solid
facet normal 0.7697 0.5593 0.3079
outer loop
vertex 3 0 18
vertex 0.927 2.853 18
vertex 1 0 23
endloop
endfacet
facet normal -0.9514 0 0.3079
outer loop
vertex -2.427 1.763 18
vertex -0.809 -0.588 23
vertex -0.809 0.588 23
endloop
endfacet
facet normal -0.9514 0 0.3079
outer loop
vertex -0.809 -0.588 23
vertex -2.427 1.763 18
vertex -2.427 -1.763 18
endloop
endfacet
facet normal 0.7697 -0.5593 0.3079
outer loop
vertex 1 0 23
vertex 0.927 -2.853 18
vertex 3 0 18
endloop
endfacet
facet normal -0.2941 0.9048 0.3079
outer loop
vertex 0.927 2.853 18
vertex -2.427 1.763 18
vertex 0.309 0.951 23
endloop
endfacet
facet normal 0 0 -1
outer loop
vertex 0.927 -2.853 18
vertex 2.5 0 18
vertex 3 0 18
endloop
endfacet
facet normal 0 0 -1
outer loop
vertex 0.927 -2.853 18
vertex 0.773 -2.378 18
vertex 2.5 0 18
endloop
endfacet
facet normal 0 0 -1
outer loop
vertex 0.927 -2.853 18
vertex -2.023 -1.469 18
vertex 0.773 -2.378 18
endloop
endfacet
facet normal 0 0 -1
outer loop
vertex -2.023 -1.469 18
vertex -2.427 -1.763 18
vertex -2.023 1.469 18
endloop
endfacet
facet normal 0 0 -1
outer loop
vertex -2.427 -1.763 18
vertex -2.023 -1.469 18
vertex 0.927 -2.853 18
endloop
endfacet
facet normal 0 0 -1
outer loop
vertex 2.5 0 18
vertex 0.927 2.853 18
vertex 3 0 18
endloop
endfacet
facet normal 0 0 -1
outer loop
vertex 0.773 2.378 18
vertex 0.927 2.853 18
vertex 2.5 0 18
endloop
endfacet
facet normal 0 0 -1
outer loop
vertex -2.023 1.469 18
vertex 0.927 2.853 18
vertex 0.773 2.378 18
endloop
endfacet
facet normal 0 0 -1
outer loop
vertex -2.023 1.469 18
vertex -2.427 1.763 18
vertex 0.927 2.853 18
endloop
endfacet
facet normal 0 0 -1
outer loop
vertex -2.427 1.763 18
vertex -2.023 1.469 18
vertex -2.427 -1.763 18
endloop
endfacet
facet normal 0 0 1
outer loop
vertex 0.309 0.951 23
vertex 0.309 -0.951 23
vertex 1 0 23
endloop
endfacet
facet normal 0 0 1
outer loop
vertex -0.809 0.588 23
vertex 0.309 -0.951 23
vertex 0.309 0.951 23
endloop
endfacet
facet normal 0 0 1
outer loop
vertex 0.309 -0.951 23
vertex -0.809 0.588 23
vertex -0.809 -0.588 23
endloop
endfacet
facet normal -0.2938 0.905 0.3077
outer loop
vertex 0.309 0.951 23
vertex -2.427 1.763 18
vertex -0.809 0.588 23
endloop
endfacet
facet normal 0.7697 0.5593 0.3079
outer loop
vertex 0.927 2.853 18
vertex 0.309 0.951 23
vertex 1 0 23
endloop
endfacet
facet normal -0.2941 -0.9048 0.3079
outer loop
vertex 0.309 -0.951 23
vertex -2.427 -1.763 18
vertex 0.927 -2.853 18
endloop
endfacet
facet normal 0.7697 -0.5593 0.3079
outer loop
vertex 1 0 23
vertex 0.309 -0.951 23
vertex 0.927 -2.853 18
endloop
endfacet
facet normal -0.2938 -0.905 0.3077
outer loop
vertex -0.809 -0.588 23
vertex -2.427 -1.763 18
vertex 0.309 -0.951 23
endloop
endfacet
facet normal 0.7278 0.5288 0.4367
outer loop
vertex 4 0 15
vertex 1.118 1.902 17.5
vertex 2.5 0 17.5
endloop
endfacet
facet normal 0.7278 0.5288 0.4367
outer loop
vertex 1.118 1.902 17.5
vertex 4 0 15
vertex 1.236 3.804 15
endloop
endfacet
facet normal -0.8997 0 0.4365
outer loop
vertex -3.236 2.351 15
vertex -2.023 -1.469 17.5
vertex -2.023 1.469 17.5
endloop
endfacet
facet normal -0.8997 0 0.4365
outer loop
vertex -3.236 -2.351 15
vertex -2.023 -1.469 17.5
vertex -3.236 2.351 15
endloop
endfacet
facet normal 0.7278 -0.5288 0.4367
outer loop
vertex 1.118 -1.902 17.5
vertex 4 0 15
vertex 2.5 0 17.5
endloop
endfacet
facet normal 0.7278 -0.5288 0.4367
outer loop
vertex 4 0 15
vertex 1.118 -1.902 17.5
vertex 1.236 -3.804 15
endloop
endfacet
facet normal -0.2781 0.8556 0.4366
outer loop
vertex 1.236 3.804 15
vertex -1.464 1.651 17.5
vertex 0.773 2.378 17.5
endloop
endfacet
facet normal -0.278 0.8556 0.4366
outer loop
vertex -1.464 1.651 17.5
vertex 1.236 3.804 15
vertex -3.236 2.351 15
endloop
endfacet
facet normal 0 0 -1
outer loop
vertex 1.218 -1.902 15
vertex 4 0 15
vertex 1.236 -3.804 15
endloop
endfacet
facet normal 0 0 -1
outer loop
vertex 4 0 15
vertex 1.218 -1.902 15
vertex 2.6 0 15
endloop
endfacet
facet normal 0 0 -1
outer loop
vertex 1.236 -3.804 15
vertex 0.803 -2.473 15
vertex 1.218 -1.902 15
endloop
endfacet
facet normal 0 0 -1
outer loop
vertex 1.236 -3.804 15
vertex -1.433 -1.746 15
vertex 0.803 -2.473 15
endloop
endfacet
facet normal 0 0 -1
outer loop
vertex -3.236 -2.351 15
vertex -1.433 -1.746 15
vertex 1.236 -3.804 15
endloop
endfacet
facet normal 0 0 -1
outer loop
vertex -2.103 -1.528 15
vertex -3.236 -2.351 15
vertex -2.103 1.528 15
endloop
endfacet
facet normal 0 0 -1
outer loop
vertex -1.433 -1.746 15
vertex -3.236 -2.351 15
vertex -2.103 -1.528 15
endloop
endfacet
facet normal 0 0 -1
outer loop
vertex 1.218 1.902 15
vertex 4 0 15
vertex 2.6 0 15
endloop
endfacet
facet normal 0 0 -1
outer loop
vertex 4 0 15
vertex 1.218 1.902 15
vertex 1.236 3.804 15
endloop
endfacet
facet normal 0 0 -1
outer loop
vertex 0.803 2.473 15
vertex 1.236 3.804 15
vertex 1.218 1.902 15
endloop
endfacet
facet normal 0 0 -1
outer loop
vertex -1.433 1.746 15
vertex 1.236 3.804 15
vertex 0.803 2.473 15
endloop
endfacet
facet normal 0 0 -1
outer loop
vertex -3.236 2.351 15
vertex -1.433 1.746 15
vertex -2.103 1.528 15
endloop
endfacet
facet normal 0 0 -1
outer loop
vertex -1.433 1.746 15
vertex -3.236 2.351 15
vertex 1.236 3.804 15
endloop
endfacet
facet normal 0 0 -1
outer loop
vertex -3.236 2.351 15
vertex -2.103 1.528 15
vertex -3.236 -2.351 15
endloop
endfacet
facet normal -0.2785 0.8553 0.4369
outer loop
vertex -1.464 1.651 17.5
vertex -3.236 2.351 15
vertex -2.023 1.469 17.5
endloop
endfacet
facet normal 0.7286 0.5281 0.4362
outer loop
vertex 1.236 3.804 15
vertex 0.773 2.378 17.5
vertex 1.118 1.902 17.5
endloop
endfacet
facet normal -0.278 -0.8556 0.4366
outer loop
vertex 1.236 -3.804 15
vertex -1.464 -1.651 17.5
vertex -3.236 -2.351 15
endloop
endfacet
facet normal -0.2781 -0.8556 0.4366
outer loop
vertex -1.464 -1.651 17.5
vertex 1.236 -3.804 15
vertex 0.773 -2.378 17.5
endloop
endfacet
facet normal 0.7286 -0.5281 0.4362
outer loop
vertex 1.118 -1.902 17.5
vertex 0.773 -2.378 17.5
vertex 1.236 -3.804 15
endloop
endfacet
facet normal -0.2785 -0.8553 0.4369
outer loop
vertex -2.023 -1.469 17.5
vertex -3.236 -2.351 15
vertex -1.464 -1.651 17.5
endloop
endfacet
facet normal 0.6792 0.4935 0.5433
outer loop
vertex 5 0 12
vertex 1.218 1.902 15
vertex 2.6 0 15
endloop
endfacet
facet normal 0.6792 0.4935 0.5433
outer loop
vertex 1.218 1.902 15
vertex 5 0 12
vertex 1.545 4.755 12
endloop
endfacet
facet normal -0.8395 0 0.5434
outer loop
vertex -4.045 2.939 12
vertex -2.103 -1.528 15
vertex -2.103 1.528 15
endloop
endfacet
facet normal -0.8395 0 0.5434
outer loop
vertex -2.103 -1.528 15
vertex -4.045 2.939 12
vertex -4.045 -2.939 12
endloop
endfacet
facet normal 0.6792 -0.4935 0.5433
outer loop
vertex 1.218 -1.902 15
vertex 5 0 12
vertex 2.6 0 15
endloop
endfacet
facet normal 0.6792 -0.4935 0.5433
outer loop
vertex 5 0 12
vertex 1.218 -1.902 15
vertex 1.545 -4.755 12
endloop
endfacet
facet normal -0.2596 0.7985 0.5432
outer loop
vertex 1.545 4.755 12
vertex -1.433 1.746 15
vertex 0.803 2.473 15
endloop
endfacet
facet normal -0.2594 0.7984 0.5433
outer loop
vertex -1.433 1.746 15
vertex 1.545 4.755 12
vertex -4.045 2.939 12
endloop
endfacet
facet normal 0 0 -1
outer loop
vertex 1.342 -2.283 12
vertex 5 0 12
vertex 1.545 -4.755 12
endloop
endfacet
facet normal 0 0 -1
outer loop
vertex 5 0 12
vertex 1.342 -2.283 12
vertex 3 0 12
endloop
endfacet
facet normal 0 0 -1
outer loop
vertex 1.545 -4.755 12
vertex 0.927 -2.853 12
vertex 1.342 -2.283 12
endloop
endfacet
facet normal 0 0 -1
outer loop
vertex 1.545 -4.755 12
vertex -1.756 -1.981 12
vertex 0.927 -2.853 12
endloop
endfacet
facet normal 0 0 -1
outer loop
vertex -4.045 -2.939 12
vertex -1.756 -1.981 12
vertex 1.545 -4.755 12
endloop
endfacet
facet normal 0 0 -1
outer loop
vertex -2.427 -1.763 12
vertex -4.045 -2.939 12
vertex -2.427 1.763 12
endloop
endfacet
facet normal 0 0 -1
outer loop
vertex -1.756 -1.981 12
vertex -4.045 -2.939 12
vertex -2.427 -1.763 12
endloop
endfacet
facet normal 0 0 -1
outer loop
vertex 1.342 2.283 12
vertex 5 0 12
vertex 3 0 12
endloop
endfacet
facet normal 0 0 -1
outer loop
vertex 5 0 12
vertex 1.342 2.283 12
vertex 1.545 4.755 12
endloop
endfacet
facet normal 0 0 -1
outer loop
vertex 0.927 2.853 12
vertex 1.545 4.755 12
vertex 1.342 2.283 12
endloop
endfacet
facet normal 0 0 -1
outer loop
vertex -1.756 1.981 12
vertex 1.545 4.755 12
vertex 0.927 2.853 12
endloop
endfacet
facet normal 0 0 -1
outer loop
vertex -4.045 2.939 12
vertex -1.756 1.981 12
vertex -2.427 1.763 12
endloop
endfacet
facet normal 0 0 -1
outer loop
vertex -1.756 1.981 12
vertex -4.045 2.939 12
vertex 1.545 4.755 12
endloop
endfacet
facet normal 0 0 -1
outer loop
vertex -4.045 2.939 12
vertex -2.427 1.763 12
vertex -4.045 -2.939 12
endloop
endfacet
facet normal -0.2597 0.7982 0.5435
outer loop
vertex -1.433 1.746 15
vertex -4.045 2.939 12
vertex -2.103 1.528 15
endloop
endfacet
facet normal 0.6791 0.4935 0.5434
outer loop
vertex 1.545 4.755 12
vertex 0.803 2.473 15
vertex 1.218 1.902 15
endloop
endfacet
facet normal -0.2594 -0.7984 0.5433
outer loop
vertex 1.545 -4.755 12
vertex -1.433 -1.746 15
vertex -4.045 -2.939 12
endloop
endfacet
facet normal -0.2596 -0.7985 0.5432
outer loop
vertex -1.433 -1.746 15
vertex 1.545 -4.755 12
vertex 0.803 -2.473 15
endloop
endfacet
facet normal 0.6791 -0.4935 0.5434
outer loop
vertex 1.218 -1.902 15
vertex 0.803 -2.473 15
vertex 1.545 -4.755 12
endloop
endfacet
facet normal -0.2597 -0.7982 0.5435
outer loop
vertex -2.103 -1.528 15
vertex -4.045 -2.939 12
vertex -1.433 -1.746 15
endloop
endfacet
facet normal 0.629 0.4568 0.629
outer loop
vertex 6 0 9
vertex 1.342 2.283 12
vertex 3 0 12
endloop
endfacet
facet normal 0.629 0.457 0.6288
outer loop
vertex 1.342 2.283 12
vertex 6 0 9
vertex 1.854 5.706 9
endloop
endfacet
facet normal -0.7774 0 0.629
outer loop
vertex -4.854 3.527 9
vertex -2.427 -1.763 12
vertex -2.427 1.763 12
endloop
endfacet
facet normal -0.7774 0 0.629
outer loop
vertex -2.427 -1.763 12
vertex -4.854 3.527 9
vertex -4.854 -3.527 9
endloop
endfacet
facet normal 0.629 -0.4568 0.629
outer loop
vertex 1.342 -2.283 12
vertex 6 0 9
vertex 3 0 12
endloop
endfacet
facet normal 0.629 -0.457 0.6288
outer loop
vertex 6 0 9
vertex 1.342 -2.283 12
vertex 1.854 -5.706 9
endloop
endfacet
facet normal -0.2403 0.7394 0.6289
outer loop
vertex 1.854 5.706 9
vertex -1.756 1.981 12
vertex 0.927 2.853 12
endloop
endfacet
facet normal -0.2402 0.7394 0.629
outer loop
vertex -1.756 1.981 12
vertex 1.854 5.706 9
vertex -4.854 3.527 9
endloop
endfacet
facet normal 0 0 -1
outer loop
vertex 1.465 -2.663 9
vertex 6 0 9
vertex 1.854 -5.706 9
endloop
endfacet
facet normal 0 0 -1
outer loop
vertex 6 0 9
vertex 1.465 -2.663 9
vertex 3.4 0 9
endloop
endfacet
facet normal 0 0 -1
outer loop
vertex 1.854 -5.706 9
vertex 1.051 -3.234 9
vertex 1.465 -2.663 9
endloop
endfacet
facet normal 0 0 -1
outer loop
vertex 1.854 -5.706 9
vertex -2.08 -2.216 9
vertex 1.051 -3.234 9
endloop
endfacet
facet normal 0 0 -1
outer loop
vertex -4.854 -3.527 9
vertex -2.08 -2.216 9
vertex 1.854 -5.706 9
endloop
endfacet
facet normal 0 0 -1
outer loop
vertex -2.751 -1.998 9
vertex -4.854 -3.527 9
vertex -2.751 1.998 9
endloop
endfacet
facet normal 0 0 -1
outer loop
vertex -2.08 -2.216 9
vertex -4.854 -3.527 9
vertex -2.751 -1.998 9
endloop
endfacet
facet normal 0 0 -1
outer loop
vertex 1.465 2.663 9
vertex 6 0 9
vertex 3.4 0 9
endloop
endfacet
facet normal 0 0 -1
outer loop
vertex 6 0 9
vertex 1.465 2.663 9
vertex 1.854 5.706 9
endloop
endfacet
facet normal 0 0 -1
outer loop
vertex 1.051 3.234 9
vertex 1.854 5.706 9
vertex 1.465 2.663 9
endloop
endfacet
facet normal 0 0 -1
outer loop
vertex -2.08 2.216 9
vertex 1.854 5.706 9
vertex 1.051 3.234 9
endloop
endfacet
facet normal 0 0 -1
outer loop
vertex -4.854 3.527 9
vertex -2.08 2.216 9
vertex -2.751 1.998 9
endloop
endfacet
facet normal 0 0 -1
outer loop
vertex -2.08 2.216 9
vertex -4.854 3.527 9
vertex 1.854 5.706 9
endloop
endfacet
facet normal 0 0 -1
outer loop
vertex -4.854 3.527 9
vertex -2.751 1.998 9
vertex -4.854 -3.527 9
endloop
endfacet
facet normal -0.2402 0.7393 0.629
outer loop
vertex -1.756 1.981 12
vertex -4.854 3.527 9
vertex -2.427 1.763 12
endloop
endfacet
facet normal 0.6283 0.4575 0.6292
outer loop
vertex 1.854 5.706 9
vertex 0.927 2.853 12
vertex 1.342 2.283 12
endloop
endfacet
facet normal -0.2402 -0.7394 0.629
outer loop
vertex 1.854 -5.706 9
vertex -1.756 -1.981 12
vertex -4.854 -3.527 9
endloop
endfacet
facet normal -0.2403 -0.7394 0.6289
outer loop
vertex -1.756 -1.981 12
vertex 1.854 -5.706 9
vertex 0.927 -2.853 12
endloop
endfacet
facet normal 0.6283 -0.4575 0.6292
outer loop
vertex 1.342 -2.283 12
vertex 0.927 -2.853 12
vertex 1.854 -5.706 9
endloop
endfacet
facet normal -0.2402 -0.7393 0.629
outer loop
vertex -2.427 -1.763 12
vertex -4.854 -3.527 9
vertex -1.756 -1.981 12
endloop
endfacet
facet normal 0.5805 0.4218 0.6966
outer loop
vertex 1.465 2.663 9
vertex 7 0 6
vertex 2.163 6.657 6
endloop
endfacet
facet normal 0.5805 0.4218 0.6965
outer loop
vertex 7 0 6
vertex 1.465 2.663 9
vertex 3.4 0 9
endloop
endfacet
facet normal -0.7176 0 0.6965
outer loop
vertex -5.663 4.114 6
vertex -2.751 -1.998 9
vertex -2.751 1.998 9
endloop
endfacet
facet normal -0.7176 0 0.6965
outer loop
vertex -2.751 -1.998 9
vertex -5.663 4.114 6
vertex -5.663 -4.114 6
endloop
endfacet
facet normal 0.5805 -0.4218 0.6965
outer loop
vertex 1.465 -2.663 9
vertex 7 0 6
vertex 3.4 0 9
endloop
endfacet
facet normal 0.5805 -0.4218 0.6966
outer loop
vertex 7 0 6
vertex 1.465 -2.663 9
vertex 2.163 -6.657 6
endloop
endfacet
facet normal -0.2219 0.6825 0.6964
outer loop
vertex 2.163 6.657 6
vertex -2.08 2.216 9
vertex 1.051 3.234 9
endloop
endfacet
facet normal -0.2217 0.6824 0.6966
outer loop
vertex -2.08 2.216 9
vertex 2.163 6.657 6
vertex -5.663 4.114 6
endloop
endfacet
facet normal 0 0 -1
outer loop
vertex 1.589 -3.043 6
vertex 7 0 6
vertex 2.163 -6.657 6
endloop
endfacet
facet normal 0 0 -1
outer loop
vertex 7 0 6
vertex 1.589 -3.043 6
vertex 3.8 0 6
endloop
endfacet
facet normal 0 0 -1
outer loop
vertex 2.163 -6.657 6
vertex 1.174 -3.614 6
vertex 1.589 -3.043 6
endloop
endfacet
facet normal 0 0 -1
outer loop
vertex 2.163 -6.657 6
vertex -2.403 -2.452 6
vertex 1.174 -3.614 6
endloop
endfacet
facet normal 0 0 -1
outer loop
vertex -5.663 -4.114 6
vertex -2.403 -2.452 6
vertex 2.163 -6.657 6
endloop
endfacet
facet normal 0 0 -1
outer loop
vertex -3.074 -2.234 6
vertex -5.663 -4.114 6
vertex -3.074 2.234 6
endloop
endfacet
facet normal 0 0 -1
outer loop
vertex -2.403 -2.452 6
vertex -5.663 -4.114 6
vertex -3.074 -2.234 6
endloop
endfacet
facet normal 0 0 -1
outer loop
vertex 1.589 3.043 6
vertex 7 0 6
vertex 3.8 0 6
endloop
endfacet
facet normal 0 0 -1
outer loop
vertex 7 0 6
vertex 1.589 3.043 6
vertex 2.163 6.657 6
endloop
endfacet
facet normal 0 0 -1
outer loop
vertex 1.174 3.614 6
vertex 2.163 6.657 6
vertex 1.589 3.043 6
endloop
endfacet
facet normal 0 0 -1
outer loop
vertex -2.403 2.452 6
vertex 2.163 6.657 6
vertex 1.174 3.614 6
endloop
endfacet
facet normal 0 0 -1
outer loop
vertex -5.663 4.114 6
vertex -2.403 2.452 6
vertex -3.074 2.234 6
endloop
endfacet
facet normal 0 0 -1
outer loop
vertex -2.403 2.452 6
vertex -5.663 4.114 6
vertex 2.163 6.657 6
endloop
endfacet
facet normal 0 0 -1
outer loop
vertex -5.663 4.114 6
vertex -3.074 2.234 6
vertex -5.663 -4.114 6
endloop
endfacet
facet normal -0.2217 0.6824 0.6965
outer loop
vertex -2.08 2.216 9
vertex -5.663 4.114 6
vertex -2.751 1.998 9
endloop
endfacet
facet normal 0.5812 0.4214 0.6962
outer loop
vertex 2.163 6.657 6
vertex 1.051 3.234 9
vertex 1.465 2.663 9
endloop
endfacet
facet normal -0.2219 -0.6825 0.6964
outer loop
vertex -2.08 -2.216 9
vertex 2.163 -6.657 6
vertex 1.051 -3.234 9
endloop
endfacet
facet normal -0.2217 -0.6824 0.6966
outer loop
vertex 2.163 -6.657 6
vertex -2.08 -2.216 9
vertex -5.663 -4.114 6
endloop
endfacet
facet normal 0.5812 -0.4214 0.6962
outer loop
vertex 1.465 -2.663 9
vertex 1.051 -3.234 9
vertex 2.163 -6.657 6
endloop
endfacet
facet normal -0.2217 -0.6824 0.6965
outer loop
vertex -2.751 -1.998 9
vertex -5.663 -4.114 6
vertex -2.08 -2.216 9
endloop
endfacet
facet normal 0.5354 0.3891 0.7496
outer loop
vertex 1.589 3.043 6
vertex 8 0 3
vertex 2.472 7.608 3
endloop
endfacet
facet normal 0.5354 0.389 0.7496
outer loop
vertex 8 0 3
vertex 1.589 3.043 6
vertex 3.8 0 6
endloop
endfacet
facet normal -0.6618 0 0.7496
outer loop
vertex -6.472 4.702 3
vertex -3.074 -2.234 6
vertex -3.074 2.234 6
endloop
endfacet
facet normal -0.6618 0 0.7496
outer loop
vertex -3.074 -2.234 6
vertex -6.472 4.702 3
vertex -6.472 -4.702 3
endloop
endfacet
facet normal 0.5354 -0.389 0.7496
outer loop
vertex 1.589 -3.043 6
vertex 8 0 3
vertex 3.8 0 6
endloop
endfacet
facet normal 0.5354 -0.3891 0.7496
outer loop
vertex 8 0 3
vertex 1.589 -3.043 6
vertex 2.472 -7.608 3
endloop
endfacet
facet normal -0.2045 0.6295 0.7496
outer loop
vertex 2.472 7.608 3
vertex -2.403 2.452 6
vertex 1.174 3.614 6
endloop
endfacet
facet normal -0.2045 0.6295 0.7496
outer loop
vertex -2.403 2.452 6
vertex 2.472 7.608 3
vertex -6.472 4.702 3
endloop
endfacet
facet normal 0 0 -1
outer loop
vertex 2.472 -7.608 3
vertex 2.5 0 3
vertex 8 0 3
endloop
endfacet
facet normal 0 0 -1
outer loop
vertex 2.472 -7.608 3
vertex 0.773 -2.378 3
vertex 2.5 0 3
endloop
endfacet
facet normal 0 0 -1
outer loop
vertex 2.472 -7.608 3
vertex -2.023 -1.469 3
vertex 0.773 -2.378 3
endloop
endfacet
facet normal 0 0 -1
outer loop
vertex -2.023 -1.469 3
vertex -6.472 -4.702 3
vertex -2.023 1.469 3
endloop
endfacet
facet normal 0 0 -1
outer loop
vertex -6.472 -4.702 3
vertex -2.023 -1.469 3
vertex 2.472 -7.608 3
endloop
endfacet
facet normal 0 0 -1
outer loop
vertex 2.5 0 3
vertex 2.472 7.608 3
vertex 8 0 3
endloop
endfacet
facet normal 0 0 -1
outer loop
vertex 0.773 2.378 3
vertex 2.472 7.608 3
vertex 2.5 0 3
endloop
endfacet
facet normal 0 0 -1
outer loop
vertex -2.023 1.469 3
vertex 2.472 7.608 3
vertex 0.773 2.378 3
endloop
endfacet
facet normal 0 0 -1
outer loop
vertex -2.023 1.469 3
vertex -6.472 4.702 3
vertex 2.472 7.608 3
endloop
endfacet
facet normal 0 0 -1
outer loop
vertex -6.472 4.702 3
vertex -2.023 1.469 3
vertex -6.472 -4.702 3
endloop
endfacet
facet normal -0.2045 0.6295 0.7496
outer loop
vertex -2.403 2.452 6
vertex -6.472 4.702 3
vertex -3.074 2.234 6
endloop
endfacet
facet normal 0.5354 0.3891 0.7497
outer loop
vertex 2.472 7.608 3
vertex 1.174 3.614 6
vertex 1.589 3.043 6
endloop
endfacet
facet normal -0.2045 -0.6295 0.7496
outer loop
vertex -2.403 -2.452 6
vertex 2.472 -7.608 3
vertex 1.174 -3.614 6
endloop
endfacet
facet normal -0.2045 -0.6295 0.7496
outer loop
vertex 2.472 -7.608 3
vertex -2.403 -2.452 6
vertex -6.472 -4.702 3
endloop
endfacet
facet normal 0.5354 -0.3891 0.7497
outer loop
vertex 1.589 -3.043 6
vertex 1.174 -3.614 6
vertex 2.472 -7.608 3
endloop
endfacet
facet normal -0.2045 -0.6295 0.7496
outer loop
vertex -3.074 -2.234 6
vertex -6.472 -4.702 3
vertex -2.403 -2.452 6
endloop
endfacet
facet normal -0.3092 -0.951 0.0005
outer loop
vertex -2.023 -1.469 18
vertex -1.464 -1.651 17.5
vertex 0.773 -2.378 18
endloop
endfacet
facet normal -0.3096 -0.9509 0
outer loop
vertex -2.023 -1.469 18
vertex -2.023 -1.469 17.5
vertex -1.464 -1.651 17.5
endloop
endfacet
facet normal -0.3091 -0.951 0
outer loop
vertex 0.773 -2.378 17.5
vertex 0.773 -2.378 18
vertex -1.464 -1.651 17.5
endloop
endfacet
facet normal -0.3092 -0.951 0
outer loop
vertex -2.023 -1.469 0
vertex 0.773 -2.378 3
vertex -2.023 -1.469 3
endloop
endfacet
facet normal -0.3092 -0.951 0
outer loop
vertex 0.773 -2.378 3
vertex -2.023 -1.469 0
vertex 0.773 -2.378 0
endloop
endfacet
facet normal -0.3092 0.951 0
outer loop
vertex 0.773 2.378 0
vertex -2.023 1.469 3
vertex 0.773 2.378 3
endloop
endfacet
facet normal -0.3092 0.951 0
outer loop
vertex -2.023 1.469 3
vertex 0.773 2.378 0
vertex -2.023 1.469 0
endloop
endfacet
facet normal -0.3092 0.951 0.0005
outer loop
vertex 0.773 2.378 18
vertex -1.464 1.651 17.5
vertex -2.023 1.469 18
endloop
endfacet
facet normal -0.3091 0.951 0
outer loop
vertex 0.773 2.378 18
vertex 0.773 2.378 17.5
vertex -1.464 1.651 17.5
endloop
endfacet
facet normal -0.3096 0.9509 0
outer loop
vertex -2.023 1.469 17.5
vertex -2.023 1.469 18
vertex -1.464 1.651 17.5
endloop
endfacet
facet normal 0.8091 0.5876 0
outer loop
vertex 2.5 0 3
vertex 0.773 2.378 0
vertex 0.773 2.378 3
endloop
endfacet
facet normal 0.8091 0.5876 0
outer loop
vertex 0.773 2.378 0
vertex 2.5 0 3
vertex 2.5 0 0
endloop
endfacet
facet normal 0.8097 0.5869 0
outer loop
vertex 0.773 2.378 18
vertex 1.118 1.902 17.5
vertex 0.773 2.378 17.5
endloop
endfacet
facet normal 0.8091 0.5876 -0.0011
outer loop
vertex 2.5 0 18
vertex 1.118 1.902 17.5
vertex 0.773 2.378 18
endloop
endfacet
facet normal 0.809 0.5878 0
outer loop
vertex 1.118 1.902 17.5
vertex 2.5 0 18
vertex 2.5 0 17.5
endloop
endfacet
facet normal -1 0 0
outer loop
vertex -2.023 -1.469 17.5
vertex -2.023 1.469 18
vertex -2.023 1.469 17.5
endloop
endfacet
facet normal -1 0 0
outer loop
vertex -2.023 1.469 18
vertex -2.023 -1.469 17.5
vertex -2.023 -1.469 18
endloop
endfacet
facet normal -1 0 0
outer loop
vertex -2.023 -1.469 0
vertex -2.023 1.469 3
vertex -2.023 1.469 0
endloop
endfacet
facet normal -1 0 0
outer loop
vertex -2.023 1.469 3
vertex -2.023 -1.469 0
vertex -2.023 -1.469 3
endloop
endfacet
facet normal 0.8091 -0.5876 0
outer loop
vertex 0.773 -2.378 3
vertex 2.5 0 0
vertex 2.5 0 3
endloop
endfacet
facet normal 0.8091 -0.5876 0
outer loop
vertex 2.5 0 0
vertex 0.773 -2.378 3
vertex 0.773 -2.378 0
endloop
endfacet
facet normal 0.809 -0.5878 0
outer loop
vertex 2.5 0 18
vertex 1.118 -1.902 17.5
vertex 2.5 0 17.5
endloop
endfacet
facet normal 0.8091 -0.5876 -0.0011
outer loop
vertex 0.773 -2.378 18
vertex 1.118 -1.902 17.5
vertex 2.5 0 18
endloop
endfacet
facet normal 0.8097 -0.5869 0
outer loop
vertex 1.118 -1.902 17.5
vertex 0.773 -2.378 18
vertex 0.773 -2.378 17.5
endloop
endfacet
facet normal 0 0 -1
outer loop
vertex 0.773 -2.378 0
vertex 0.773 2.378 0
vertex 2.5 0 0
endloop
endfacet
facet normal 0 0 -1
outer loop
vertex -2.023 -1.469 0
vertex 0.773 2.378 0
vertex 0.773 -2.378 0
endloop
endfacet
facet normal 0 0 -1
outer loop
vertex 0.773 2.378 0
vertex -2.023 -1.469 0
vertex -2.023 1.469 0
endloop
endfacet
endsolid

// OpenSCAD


//Number of Sides
NumSides = 5; //[3:1:10]
$fn = NumSides;

//This changes the height of the tree
Height = 12; //[10:1:30]

//This changes the spacing of each segment
Spacing = 3; //[1:.5:10]

//Diameter of the trunk
TrunkDiameter = 5; //[2:1:25]

//Height of Segment
CylinderHeight = 5; //[1:1:30]

//Radius of Segments
RadiusValue = 1; //[1:.5:5]
//cylinder(h = 15, r1 = 15, r2 = 1);


for (i = [Height - 3:-1:4]) 
{
    translate([0,0,i*Spacing - (3*Spacing)])
    {
       cylinder(h = CylinderHeight, r1 = (Height-i) * RadiusValue, r2 = 1);
    }
}
cylinder(h = ((Height - 6)*Spacing), d = TrunkDiameter);
